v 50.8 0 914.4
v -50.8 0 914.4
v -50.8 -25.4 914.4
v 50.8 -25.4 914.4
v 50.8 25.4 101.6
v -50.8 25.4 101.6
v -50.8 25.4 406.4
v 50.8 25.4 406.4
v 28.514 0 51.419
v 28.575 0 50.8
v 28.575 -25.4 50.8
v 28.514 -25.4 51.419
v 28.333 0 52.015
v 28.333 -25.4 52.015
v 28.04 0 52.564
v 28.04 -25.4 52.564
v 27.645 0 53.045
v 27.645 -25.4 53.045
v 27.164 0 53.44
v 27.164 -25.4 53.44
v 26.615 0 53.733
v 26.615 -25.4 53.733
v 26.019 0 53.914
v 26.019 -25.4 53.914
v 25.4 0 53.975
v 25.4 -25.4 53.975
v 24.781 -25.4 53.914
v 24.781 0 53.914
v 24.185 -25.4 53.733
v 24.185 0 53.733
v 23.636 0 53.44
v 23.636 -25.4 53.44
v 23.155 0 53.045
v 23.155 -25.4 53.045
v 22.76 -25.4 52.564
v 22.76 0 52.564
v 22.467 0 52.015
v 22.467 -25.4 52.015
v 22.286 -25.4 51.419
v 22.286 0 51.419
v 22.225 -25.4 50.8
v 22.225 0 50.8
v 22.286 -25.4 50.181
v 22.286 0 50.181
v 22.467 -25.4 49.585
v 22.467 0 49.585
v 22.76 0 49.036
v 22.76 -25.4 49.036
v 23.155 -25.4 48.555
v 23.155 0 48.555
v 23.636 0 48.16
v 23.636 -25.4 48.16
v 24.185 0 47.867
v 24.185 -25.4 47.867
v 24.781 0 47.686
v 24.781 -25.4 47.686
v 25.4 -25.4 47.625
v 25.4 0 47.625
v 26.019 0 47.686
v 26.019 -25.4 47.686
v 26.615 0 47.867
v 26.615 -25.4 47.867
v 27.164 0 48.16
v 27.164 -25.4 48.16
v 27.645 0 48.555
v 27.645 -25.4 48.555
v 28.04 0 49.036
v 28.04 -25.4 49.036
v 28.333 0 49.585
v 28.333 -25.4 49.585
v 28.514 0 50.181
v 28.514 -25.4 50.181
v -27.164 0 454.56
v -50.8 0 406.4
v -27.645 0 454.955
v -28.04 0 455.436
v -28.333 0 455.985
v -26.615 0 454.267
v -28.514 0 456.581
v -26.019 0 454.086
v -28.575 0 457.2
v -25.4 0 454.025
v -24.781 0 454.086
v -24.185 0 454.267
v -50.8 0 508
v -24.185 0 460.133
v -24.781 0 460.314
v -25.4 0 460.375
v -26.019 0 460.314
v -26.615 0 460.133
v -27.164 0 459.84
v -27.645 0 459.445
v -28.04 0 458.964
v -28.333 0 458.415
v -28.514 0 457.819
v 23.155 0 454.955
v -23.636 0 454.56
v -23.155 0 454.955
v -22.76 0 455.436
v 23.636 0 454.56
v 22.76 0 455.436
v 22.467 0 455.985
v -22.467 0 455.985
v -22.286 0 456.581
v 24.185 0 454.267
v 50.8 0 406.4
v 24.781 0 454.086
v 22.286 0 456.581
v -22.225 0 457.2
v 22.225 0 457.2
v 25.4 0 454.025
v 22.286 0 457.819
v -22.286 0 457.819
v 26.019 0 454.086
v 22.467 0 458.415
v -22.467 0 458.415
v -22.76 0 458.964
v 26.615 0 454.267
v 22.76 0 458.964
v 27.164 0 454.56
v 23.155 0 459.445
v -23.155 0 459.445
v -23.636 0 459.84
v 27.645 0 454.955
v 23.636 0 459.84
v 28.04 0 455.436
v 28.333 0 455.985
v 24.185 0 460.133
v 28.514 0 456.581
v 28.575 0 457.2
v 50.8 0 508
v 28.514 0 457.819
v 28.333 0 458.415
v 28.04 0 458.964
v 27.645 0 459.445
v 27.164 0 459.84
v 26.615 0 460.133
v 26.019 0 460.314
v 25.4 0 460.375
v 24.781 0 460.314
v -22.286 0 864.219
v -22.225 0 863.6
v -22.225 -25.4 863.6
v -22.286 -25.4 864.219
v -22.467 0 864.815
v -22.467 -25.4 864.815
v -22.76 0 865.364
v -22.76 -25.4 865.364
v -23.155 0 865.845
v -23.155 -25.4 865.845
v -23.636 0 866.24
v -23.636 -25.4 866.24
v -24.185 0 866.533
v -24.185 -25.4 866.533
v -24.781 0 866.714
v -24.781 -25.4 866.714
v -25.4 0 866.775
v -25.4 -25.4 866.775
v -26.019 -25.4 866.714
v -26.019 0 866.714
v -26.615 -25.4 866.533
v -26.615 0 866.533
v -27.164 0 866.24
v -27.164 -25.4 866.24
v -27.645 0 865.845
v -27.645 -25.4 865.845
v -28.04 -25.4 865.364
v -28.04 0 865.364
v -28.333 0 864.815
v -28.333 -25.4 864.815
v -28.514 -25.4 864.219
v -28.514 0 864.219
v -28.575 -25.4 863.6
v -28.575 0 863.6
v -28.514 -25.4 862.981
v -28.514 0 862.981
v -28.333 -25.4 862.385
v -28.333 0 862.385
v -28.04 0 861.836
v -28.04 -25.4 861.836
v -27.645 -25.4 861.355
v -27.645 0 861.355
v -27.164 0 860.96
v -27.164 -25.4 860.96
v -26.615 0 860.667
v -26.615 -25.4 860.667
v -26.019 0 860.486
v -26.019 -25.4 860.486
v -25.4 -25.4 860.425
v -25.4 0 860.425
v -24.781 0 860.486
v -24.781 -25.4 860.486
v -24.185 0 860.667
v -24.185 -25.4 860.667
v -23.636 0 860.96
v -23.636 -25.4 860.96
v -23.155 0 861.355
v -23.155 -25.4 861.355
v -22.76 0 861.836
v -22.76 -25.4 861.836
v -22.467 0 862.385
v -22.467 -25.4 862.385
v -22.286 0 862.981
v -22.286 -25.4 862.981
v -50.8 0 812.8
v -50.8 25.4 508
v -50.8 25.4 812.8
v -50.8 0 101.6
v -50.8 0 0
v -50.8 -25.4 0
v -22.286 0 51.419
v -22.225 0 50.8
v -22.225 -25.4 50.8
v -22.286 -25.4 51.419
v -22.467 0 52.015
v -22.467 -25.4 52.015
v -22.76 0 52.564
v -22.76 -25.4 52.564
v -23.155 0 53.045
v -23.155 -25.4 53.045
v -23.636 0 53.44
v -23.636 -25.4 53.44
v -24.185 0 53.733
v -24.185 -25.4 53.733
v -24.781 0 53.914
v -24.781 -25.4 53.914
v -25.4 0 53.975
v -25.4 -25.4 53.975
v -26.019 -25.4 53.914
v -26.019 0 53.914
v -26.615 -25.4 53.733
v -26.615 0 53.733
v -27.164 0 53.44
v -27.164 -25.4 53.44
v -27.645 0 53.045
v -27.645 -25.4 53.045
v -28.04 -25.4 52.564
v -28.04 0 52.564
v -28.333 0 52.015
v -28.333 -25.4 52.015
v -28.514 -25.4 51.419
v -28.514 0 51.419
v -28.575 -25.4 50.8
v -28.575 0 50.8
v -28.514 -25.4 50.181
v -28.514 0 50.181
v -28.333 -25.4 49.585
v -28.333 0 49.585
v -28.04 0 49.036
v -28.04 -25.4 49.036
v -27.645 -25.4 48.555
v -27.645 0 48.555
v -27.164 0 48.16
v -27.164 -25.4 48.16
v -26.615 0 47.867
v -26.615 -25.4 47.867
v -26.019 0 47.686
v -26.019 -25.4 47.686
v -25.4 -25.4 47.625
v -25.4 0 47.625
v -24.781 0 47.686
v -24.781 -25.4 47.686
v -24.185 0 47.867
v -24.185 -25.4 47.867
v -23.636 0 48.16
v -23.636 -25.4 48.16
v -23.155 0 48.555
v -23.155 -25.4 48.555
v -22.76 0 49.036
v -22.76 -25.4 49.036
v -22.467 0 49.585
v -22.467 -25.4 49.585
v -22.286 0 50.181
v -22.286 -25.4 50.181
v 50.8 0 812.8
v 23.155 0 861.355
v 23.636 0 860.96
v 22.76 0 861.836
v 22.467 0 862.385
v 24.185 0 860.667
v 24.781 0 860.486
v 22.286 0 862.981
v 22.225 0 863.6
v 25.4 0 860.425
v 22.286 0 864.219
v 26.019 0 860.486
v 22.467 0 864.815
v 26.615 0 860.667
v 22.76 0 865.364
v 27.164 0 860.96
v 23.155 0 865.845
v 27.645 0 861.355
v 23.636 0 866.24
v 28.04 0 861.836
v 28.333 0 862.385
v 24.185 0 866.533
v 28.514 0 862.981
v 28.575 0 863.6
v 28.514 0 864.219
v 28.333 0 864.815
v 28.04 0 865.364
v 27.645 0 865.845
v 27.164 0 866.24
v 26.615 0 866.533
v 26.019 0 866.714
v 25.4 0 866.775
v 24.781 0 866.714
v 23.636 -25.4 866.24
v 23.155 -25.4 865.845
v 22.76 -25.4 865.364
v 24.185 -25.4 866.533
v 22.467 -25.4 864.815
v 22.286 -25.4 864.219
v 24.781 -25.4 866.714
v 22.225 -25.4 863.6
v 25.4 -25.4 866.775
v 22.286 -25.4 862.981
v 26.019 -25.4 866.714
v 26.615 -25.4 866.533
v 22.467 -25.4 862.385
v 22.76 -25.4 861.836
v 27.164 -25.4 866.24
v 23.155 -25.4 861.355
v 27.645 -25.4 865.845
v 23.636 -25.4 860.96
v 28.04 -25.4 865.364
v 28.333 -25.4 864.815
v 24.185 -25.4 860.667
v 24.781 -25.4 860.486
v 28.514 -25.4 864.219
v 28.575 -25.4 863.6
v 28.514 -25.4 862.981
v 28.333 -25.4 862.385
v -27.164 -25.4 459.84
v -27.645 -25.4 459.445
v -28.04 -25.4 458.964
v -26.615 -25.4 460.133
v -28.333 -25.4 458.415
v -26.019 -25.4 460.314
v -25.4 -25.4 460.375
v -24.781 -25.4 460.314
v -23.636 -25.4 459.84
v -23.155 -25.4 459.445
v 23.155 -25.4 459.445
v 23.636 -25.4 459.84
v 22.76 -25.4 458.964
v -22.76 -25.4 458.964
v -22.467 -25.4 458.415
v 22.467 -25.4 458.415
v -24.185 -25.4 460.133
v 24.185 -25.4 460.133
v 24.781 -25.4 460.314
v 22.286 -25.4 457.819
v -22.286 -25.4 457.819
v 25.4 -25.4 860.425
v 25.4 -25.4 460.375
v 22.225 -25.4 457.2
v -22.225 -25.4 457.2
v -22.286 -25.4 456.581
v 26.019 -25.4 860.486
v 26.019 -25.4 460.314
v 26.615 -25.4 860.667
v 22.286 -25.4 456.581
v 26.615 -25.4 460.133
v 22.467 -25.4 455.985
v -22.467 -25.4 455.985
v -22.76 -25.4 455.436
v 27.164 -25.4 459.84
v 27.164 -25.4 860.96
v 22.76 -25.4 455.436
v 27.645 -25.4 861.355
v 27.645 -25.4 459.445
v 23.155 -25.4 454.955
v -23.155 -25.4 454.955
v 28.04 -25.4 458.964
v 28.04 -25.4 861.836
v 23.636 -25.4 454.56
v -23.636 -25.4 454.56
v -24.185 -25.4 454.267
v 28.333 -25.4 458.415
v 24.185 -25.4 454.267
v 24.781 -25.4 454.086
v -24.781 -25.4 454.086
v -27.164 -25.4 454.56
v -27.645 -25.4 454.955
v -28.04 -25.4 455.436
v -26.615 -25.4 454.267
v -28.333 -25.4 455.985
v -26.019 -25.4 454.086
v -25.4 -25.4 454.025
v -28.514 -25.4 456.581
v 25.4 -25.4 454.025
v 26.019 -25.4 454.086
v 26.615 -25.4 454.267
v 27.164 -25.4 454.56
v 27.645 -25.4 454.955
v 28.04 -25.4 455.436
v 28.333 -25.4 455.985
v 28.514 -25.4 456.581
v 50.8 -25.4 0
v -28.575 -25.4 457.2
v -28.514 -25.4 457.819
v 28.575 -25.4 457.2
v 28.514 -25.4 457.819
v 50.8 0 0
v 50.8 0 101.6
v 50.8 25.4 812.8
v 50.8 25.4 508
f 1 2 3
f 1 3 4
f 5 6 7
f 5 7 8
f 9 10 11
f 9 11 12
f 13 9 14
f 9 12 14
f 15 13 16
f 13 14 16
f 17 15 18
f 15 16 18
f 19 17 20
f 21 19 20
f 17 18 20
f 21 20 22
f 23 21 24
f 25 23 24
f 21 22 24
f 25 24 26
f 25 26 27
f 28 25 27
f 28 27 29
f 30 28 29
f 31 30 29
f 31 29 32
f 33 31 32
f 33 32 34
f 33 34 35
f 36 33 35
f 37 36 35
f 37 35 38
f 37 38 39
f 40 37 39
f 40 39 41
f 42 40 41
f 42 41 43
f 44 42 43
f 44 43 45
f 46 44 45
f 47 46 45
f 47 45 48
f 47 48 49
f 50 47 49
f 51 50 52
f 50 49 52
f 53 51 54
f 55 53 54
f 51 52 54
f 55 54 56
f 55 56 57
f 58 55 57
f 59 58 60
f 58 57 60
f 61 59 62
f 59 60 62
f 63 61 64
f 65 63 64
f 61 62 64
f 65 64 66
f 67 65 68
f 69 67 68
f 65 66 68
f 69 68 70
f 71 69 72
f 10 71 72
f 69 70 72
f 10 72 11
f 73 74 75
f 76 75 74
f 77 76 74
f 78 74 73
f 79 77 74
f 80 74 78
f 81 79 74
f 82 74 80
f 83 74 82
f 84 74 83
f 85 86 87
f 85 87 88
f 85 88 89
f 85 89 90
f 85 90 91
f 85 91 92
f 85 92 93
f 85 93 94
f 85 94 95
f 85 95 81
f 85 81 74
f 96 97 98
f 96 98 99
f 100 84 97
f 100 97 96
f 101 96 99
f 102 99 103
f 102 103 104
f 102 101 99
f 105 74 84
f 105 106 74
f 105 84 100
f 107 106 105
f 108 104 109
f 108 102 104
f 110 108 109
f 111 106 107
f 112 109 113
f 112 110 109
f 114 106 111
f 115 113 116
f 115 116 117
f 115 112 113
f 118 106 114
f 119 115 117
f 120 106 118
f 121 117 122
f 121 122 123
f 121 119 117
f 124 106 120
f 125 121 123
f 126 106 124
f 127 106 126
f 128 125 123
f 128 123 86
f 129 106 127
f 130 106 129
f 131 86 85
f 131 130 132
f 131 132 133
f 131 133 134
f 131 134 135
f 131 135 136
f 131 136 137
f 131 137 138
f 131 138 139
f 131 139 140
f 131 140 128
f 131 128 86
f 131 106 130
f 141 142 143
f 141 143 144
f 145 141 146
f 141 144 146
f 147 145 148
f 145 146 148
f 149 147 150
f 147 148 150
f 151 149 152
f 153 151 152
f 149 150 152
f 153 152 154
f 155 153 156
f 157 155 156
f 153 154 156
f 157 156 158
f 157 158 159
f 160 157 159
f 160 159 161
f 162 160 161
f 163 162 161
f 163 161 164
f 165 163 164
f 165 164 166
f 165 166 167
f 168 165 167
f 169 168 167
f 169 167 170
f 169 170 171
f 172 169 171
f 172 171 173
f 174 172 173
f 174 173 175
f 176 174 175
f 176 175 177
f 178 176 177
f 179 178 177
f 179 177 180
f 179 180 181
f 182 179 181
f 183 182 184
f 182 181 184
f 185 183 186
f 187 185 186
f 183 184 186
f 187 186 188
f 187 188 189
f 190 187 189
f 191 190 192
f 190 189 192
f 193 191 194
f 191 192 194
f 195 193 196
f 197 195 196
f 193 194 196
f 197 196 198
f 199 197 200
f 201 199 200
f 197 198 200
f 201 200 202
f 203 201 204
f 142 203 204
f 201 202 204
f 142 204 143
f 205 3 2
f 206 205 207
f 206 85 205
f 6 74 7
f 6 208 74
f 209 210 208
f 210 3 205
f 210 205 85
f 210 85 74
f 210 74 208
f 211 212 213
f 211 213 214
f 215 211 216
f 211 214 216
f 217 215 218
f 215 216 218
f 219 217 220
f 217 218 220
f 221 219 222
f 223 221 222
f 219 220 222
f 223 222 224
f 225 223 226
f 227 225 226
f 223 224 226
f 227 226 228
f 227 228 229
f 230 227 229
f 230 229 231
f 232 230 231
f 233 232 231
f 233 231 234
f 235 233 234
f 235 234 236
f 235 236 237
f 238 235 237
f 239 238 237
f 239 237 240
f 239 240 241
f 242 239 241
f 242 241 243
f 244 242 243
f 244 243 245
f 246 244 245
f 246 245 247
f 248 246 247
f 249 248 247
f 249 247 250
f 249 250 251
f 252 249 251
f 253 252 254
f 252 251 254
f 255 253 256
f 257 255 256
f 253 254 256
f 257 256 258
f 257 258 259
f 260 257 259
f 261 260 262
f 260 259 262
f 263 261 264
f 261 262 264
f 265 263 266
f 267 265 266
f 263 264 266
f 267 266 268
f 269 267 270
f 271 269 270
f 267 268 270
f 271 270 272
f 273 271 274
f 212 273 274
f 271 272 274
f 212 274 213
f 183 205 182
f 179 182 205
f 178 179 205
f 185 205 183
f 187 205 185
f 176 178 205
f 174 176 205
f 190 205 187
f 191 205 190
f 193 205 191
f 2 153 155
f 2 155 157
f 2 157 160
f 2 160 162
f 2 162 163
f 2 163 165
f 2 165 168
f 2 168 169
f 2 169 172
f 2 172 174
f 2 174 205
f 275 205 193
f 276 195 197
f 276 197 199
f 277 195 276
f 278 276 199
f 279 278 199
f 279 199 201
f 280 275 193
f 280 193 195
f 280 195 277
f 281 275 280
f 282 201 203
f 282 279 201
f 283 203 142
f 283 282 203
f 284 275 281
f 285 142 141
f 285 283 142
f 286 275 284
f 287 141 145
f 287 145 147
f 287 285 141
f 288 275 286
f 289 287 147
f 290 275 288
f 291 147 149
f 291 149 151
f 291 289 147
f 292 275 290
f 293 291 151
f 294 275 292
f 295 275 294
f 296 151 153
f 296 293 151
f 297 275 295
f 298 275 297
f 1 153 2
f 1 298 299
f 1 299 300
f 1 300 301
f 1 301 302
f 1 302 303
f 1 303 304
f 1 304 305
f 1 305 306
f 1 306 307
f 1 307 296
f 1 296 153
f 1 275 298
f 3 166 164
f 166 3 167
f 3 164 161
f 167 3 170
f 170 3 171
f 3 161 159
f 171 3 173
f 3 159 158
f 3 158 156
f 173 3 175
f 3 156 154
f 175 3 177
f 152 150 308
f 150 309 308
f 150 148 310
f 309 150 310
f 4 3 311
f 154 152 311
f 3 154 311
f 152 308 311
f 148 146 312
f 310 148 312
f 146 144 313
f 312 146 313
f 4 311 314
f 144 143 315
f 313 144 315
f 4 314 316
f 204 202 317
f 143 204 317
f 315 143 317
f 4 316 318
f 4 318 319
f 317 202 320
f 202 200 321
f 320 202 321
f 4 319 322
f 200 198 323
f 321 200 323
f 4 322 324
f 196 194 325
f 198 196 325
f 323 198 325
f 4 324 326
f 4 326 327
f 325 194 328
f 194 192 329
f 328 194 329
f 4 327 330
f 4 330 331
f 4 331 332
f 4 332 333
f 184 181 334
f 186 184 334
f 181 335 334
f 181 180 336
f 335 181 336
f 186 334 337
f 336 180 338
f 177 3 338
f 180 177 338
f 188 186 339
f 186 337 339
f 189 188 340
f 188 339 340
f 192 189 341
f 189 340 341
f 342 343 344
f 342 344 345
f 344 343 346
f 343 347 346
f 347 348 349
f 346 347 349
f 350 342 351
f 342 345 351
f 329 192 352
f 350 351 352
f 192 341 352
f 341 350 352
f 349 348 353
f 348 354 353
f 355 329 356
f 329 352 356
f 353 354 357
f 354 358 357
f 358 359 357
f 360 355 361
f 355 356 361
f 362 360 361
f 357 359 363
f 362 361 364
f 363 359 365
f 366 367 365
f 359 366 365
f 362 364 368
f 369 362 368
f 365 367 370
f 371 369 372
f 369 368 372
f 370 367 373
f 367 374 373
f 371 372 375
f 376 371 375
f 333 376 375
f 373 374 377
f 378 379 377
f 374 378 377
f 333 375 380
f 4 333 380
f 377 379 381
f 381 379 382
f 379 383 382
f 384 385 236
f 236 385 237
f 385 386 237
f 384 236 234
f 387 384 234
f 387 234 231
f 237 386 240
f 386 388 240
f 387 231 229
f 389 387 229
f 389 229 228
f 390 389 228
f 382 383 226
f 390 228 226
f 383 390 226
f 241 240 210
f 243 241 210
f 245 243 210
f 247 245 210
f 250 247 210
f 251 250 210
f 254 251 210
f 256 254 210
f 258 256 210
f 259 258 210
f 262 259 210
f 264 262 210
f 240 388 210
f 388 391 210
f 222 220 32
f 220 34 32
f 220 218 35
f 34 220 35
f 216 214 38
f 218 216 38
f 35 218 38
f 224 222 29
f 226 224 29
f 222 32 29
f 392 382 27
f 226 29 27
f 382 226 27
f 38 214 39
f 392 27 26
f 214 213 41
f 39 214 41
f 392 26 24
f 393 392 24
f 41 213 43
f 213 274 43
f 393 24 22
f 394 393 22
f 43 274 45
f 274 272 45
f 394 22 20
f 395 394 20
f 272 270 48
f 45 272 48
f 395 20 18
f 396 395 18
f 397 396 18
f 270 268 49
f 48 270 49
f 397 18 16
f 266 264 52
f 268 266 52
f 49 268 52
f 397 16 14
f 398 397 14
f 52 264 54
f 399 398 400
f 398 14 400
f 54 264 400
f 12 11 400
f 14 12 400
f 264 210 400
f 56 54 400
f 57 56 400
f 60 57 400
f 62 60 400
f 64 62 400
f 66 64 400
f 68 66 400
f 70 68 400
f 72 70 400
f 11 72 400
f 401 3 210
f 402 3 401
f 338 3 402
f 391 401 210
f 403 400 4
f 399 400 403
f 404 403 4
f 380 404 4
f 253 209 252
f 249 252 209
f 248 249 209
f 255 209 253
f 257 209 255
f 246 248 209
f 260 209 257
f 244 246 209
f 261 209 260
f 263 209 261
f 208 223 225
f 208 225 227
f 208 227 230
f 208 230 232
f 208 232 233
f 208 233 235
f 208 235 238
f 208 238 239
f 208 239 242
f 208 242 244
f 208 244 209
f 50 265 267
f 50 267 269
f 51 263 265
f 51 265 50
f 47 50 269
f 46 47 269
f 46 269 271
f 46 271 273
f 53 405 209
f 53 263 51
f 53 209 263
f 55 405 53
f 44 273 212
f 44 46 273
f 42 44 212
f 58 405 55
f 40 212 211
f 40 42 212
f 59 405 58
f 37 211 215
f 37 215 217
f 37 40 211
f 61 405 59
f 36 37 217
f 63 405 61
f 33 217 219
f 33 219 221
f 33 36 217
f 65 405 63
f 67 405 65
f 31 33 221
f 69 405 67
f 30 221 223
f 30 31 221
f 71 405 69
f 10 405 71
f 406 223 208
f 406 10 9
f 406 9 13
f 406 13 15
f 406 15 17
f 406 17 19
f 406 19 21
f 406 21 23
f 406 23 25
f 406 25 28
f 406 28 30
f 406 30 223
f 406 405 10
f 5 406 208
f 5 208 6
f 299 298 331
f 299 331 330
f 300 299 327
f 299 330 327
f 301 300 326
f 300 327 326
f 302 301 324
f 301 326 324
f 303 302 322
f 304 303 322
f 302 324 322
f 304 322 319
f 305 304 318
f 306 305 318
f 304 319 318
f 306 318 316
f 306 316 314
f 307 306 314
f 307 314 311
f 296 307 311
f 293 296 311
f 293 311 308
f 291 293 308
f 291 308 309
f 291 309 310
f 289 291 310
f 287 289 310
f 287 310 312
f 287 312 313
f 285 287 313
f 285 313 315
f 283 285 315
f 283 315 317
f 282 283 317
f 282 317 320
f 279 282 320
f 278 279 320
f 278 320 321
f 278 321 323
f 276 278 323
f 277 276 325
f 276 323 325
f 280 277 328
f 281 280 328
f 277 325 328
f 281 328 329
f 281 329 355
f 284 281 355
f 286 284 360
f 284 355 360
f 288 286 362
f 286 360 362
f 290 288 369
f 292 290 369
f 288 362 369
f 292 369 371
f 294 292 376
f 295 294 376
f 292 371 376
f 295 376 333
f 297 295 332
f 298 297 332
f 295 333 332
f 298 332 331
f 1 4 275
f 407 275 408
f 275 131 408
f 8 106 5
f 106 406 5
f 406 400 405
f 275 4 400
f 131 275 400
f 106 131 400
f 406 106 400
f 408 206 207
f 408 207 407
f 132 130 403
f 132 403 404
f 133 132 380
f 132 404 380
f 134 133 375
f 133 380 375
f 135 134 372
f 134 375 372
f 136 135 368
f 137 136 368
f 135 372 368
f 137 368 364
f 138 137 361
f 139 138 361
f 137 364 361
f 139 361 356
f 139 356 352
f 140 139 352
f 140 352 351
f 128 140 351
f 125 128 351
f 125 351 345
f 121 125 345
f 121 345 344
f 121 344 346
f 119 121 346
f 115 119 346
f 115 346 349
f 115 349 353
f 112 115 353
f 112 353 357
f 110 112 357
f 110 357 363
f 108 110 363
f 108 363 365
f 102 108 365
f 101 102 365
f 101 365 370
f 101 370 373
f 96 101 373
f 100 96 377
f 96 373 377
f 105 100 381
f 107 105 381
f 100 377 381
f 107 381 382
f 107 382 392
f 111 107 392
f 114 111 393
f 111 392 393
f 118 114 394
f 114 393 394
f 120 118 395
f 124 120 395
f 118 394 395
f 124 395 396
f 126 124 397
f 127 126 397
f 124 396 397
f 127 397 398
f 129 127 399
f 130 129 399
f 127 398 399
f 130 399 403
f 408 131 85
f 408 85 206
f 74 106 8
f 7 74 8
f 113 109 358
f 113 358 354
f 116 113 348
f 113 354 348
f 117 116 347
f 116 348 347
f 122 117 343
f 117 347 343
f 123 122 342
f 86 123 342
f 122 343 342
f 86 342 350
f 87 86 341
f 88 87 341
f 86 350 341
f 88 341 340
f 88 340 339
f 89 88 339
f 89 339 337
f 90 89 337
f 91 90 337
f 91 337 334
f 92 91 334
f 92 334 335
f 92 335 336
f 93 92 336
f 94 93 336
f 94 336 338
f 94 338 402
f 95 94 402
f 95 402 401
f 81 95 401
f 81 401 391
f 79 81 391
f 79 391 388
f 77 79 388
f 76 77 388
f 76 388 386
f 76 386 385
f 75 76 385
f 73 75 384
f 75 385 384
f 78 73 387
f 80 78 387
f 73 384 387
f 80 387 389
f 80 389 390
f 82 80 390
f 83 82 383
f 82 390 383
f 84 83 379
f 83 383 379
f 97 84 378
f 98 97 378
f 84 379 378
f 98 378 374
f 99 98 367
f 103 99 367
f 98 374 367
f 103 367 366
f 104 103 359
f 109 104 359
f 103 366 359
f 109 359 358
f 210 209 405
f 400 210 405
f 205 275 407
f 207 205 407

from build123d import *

# Parameters (mm, degrees)
F0_W     = 101.6
F0_H     = 50.8
F1_DEPTH = 914.4
F2_W     = 25.4
F2_H     = 101.6
F3_DEPTH = 101.601
F4_R     = 3.175
F5_DEPTH = 50.801


with BuildPart() as f1:
    # F0 (on Top) → F1 (new body)
    with BuildSketch(Plane.XY):
        Rectangle(F0_W, F0_H)
    extrude(amount=F1_DEPTH)

    # F2 (on face) → F3 (cut, through all)
    with BuildSketch(Plane.YZ.offset(50.8)):
        with Locations((12.7, 457.2)):
            Rectangle(F2_W, F2_H)
        with Locations((12.7, 50.8)):
            Rectangle(F2_W, F2_H)
        with Locations((12.7, 863.6)):
            Rectangle(F2_W, F2_H)
    extrude(amount=-F3_DEPTH, mode=Mode.SUBTRACT)

    # F4 (on face) → F5 (cut, through all)
    with BuildSketch(Plane.XZ.offset(25.4)):
        with Locations((-25.4, 863.6)):
            Circle(F4_R)
        with Locations((-25.4, 457.2)):
            Circle(F4_R)
        with Locations((-25.4, 50.8)):
            Circle(F4_R)
        with Locations((25.4, 863.6)):
            Circle(F4_R)
        with Locations((25.4, 457.2)):
            Circle(F4_R)
        with Locations((25.4, 50.8)):
            Circle(F4_R)
    extrude(amount=-F5_DEPTH, mode=Mode.SUBTRACT)


solid = f1.part
